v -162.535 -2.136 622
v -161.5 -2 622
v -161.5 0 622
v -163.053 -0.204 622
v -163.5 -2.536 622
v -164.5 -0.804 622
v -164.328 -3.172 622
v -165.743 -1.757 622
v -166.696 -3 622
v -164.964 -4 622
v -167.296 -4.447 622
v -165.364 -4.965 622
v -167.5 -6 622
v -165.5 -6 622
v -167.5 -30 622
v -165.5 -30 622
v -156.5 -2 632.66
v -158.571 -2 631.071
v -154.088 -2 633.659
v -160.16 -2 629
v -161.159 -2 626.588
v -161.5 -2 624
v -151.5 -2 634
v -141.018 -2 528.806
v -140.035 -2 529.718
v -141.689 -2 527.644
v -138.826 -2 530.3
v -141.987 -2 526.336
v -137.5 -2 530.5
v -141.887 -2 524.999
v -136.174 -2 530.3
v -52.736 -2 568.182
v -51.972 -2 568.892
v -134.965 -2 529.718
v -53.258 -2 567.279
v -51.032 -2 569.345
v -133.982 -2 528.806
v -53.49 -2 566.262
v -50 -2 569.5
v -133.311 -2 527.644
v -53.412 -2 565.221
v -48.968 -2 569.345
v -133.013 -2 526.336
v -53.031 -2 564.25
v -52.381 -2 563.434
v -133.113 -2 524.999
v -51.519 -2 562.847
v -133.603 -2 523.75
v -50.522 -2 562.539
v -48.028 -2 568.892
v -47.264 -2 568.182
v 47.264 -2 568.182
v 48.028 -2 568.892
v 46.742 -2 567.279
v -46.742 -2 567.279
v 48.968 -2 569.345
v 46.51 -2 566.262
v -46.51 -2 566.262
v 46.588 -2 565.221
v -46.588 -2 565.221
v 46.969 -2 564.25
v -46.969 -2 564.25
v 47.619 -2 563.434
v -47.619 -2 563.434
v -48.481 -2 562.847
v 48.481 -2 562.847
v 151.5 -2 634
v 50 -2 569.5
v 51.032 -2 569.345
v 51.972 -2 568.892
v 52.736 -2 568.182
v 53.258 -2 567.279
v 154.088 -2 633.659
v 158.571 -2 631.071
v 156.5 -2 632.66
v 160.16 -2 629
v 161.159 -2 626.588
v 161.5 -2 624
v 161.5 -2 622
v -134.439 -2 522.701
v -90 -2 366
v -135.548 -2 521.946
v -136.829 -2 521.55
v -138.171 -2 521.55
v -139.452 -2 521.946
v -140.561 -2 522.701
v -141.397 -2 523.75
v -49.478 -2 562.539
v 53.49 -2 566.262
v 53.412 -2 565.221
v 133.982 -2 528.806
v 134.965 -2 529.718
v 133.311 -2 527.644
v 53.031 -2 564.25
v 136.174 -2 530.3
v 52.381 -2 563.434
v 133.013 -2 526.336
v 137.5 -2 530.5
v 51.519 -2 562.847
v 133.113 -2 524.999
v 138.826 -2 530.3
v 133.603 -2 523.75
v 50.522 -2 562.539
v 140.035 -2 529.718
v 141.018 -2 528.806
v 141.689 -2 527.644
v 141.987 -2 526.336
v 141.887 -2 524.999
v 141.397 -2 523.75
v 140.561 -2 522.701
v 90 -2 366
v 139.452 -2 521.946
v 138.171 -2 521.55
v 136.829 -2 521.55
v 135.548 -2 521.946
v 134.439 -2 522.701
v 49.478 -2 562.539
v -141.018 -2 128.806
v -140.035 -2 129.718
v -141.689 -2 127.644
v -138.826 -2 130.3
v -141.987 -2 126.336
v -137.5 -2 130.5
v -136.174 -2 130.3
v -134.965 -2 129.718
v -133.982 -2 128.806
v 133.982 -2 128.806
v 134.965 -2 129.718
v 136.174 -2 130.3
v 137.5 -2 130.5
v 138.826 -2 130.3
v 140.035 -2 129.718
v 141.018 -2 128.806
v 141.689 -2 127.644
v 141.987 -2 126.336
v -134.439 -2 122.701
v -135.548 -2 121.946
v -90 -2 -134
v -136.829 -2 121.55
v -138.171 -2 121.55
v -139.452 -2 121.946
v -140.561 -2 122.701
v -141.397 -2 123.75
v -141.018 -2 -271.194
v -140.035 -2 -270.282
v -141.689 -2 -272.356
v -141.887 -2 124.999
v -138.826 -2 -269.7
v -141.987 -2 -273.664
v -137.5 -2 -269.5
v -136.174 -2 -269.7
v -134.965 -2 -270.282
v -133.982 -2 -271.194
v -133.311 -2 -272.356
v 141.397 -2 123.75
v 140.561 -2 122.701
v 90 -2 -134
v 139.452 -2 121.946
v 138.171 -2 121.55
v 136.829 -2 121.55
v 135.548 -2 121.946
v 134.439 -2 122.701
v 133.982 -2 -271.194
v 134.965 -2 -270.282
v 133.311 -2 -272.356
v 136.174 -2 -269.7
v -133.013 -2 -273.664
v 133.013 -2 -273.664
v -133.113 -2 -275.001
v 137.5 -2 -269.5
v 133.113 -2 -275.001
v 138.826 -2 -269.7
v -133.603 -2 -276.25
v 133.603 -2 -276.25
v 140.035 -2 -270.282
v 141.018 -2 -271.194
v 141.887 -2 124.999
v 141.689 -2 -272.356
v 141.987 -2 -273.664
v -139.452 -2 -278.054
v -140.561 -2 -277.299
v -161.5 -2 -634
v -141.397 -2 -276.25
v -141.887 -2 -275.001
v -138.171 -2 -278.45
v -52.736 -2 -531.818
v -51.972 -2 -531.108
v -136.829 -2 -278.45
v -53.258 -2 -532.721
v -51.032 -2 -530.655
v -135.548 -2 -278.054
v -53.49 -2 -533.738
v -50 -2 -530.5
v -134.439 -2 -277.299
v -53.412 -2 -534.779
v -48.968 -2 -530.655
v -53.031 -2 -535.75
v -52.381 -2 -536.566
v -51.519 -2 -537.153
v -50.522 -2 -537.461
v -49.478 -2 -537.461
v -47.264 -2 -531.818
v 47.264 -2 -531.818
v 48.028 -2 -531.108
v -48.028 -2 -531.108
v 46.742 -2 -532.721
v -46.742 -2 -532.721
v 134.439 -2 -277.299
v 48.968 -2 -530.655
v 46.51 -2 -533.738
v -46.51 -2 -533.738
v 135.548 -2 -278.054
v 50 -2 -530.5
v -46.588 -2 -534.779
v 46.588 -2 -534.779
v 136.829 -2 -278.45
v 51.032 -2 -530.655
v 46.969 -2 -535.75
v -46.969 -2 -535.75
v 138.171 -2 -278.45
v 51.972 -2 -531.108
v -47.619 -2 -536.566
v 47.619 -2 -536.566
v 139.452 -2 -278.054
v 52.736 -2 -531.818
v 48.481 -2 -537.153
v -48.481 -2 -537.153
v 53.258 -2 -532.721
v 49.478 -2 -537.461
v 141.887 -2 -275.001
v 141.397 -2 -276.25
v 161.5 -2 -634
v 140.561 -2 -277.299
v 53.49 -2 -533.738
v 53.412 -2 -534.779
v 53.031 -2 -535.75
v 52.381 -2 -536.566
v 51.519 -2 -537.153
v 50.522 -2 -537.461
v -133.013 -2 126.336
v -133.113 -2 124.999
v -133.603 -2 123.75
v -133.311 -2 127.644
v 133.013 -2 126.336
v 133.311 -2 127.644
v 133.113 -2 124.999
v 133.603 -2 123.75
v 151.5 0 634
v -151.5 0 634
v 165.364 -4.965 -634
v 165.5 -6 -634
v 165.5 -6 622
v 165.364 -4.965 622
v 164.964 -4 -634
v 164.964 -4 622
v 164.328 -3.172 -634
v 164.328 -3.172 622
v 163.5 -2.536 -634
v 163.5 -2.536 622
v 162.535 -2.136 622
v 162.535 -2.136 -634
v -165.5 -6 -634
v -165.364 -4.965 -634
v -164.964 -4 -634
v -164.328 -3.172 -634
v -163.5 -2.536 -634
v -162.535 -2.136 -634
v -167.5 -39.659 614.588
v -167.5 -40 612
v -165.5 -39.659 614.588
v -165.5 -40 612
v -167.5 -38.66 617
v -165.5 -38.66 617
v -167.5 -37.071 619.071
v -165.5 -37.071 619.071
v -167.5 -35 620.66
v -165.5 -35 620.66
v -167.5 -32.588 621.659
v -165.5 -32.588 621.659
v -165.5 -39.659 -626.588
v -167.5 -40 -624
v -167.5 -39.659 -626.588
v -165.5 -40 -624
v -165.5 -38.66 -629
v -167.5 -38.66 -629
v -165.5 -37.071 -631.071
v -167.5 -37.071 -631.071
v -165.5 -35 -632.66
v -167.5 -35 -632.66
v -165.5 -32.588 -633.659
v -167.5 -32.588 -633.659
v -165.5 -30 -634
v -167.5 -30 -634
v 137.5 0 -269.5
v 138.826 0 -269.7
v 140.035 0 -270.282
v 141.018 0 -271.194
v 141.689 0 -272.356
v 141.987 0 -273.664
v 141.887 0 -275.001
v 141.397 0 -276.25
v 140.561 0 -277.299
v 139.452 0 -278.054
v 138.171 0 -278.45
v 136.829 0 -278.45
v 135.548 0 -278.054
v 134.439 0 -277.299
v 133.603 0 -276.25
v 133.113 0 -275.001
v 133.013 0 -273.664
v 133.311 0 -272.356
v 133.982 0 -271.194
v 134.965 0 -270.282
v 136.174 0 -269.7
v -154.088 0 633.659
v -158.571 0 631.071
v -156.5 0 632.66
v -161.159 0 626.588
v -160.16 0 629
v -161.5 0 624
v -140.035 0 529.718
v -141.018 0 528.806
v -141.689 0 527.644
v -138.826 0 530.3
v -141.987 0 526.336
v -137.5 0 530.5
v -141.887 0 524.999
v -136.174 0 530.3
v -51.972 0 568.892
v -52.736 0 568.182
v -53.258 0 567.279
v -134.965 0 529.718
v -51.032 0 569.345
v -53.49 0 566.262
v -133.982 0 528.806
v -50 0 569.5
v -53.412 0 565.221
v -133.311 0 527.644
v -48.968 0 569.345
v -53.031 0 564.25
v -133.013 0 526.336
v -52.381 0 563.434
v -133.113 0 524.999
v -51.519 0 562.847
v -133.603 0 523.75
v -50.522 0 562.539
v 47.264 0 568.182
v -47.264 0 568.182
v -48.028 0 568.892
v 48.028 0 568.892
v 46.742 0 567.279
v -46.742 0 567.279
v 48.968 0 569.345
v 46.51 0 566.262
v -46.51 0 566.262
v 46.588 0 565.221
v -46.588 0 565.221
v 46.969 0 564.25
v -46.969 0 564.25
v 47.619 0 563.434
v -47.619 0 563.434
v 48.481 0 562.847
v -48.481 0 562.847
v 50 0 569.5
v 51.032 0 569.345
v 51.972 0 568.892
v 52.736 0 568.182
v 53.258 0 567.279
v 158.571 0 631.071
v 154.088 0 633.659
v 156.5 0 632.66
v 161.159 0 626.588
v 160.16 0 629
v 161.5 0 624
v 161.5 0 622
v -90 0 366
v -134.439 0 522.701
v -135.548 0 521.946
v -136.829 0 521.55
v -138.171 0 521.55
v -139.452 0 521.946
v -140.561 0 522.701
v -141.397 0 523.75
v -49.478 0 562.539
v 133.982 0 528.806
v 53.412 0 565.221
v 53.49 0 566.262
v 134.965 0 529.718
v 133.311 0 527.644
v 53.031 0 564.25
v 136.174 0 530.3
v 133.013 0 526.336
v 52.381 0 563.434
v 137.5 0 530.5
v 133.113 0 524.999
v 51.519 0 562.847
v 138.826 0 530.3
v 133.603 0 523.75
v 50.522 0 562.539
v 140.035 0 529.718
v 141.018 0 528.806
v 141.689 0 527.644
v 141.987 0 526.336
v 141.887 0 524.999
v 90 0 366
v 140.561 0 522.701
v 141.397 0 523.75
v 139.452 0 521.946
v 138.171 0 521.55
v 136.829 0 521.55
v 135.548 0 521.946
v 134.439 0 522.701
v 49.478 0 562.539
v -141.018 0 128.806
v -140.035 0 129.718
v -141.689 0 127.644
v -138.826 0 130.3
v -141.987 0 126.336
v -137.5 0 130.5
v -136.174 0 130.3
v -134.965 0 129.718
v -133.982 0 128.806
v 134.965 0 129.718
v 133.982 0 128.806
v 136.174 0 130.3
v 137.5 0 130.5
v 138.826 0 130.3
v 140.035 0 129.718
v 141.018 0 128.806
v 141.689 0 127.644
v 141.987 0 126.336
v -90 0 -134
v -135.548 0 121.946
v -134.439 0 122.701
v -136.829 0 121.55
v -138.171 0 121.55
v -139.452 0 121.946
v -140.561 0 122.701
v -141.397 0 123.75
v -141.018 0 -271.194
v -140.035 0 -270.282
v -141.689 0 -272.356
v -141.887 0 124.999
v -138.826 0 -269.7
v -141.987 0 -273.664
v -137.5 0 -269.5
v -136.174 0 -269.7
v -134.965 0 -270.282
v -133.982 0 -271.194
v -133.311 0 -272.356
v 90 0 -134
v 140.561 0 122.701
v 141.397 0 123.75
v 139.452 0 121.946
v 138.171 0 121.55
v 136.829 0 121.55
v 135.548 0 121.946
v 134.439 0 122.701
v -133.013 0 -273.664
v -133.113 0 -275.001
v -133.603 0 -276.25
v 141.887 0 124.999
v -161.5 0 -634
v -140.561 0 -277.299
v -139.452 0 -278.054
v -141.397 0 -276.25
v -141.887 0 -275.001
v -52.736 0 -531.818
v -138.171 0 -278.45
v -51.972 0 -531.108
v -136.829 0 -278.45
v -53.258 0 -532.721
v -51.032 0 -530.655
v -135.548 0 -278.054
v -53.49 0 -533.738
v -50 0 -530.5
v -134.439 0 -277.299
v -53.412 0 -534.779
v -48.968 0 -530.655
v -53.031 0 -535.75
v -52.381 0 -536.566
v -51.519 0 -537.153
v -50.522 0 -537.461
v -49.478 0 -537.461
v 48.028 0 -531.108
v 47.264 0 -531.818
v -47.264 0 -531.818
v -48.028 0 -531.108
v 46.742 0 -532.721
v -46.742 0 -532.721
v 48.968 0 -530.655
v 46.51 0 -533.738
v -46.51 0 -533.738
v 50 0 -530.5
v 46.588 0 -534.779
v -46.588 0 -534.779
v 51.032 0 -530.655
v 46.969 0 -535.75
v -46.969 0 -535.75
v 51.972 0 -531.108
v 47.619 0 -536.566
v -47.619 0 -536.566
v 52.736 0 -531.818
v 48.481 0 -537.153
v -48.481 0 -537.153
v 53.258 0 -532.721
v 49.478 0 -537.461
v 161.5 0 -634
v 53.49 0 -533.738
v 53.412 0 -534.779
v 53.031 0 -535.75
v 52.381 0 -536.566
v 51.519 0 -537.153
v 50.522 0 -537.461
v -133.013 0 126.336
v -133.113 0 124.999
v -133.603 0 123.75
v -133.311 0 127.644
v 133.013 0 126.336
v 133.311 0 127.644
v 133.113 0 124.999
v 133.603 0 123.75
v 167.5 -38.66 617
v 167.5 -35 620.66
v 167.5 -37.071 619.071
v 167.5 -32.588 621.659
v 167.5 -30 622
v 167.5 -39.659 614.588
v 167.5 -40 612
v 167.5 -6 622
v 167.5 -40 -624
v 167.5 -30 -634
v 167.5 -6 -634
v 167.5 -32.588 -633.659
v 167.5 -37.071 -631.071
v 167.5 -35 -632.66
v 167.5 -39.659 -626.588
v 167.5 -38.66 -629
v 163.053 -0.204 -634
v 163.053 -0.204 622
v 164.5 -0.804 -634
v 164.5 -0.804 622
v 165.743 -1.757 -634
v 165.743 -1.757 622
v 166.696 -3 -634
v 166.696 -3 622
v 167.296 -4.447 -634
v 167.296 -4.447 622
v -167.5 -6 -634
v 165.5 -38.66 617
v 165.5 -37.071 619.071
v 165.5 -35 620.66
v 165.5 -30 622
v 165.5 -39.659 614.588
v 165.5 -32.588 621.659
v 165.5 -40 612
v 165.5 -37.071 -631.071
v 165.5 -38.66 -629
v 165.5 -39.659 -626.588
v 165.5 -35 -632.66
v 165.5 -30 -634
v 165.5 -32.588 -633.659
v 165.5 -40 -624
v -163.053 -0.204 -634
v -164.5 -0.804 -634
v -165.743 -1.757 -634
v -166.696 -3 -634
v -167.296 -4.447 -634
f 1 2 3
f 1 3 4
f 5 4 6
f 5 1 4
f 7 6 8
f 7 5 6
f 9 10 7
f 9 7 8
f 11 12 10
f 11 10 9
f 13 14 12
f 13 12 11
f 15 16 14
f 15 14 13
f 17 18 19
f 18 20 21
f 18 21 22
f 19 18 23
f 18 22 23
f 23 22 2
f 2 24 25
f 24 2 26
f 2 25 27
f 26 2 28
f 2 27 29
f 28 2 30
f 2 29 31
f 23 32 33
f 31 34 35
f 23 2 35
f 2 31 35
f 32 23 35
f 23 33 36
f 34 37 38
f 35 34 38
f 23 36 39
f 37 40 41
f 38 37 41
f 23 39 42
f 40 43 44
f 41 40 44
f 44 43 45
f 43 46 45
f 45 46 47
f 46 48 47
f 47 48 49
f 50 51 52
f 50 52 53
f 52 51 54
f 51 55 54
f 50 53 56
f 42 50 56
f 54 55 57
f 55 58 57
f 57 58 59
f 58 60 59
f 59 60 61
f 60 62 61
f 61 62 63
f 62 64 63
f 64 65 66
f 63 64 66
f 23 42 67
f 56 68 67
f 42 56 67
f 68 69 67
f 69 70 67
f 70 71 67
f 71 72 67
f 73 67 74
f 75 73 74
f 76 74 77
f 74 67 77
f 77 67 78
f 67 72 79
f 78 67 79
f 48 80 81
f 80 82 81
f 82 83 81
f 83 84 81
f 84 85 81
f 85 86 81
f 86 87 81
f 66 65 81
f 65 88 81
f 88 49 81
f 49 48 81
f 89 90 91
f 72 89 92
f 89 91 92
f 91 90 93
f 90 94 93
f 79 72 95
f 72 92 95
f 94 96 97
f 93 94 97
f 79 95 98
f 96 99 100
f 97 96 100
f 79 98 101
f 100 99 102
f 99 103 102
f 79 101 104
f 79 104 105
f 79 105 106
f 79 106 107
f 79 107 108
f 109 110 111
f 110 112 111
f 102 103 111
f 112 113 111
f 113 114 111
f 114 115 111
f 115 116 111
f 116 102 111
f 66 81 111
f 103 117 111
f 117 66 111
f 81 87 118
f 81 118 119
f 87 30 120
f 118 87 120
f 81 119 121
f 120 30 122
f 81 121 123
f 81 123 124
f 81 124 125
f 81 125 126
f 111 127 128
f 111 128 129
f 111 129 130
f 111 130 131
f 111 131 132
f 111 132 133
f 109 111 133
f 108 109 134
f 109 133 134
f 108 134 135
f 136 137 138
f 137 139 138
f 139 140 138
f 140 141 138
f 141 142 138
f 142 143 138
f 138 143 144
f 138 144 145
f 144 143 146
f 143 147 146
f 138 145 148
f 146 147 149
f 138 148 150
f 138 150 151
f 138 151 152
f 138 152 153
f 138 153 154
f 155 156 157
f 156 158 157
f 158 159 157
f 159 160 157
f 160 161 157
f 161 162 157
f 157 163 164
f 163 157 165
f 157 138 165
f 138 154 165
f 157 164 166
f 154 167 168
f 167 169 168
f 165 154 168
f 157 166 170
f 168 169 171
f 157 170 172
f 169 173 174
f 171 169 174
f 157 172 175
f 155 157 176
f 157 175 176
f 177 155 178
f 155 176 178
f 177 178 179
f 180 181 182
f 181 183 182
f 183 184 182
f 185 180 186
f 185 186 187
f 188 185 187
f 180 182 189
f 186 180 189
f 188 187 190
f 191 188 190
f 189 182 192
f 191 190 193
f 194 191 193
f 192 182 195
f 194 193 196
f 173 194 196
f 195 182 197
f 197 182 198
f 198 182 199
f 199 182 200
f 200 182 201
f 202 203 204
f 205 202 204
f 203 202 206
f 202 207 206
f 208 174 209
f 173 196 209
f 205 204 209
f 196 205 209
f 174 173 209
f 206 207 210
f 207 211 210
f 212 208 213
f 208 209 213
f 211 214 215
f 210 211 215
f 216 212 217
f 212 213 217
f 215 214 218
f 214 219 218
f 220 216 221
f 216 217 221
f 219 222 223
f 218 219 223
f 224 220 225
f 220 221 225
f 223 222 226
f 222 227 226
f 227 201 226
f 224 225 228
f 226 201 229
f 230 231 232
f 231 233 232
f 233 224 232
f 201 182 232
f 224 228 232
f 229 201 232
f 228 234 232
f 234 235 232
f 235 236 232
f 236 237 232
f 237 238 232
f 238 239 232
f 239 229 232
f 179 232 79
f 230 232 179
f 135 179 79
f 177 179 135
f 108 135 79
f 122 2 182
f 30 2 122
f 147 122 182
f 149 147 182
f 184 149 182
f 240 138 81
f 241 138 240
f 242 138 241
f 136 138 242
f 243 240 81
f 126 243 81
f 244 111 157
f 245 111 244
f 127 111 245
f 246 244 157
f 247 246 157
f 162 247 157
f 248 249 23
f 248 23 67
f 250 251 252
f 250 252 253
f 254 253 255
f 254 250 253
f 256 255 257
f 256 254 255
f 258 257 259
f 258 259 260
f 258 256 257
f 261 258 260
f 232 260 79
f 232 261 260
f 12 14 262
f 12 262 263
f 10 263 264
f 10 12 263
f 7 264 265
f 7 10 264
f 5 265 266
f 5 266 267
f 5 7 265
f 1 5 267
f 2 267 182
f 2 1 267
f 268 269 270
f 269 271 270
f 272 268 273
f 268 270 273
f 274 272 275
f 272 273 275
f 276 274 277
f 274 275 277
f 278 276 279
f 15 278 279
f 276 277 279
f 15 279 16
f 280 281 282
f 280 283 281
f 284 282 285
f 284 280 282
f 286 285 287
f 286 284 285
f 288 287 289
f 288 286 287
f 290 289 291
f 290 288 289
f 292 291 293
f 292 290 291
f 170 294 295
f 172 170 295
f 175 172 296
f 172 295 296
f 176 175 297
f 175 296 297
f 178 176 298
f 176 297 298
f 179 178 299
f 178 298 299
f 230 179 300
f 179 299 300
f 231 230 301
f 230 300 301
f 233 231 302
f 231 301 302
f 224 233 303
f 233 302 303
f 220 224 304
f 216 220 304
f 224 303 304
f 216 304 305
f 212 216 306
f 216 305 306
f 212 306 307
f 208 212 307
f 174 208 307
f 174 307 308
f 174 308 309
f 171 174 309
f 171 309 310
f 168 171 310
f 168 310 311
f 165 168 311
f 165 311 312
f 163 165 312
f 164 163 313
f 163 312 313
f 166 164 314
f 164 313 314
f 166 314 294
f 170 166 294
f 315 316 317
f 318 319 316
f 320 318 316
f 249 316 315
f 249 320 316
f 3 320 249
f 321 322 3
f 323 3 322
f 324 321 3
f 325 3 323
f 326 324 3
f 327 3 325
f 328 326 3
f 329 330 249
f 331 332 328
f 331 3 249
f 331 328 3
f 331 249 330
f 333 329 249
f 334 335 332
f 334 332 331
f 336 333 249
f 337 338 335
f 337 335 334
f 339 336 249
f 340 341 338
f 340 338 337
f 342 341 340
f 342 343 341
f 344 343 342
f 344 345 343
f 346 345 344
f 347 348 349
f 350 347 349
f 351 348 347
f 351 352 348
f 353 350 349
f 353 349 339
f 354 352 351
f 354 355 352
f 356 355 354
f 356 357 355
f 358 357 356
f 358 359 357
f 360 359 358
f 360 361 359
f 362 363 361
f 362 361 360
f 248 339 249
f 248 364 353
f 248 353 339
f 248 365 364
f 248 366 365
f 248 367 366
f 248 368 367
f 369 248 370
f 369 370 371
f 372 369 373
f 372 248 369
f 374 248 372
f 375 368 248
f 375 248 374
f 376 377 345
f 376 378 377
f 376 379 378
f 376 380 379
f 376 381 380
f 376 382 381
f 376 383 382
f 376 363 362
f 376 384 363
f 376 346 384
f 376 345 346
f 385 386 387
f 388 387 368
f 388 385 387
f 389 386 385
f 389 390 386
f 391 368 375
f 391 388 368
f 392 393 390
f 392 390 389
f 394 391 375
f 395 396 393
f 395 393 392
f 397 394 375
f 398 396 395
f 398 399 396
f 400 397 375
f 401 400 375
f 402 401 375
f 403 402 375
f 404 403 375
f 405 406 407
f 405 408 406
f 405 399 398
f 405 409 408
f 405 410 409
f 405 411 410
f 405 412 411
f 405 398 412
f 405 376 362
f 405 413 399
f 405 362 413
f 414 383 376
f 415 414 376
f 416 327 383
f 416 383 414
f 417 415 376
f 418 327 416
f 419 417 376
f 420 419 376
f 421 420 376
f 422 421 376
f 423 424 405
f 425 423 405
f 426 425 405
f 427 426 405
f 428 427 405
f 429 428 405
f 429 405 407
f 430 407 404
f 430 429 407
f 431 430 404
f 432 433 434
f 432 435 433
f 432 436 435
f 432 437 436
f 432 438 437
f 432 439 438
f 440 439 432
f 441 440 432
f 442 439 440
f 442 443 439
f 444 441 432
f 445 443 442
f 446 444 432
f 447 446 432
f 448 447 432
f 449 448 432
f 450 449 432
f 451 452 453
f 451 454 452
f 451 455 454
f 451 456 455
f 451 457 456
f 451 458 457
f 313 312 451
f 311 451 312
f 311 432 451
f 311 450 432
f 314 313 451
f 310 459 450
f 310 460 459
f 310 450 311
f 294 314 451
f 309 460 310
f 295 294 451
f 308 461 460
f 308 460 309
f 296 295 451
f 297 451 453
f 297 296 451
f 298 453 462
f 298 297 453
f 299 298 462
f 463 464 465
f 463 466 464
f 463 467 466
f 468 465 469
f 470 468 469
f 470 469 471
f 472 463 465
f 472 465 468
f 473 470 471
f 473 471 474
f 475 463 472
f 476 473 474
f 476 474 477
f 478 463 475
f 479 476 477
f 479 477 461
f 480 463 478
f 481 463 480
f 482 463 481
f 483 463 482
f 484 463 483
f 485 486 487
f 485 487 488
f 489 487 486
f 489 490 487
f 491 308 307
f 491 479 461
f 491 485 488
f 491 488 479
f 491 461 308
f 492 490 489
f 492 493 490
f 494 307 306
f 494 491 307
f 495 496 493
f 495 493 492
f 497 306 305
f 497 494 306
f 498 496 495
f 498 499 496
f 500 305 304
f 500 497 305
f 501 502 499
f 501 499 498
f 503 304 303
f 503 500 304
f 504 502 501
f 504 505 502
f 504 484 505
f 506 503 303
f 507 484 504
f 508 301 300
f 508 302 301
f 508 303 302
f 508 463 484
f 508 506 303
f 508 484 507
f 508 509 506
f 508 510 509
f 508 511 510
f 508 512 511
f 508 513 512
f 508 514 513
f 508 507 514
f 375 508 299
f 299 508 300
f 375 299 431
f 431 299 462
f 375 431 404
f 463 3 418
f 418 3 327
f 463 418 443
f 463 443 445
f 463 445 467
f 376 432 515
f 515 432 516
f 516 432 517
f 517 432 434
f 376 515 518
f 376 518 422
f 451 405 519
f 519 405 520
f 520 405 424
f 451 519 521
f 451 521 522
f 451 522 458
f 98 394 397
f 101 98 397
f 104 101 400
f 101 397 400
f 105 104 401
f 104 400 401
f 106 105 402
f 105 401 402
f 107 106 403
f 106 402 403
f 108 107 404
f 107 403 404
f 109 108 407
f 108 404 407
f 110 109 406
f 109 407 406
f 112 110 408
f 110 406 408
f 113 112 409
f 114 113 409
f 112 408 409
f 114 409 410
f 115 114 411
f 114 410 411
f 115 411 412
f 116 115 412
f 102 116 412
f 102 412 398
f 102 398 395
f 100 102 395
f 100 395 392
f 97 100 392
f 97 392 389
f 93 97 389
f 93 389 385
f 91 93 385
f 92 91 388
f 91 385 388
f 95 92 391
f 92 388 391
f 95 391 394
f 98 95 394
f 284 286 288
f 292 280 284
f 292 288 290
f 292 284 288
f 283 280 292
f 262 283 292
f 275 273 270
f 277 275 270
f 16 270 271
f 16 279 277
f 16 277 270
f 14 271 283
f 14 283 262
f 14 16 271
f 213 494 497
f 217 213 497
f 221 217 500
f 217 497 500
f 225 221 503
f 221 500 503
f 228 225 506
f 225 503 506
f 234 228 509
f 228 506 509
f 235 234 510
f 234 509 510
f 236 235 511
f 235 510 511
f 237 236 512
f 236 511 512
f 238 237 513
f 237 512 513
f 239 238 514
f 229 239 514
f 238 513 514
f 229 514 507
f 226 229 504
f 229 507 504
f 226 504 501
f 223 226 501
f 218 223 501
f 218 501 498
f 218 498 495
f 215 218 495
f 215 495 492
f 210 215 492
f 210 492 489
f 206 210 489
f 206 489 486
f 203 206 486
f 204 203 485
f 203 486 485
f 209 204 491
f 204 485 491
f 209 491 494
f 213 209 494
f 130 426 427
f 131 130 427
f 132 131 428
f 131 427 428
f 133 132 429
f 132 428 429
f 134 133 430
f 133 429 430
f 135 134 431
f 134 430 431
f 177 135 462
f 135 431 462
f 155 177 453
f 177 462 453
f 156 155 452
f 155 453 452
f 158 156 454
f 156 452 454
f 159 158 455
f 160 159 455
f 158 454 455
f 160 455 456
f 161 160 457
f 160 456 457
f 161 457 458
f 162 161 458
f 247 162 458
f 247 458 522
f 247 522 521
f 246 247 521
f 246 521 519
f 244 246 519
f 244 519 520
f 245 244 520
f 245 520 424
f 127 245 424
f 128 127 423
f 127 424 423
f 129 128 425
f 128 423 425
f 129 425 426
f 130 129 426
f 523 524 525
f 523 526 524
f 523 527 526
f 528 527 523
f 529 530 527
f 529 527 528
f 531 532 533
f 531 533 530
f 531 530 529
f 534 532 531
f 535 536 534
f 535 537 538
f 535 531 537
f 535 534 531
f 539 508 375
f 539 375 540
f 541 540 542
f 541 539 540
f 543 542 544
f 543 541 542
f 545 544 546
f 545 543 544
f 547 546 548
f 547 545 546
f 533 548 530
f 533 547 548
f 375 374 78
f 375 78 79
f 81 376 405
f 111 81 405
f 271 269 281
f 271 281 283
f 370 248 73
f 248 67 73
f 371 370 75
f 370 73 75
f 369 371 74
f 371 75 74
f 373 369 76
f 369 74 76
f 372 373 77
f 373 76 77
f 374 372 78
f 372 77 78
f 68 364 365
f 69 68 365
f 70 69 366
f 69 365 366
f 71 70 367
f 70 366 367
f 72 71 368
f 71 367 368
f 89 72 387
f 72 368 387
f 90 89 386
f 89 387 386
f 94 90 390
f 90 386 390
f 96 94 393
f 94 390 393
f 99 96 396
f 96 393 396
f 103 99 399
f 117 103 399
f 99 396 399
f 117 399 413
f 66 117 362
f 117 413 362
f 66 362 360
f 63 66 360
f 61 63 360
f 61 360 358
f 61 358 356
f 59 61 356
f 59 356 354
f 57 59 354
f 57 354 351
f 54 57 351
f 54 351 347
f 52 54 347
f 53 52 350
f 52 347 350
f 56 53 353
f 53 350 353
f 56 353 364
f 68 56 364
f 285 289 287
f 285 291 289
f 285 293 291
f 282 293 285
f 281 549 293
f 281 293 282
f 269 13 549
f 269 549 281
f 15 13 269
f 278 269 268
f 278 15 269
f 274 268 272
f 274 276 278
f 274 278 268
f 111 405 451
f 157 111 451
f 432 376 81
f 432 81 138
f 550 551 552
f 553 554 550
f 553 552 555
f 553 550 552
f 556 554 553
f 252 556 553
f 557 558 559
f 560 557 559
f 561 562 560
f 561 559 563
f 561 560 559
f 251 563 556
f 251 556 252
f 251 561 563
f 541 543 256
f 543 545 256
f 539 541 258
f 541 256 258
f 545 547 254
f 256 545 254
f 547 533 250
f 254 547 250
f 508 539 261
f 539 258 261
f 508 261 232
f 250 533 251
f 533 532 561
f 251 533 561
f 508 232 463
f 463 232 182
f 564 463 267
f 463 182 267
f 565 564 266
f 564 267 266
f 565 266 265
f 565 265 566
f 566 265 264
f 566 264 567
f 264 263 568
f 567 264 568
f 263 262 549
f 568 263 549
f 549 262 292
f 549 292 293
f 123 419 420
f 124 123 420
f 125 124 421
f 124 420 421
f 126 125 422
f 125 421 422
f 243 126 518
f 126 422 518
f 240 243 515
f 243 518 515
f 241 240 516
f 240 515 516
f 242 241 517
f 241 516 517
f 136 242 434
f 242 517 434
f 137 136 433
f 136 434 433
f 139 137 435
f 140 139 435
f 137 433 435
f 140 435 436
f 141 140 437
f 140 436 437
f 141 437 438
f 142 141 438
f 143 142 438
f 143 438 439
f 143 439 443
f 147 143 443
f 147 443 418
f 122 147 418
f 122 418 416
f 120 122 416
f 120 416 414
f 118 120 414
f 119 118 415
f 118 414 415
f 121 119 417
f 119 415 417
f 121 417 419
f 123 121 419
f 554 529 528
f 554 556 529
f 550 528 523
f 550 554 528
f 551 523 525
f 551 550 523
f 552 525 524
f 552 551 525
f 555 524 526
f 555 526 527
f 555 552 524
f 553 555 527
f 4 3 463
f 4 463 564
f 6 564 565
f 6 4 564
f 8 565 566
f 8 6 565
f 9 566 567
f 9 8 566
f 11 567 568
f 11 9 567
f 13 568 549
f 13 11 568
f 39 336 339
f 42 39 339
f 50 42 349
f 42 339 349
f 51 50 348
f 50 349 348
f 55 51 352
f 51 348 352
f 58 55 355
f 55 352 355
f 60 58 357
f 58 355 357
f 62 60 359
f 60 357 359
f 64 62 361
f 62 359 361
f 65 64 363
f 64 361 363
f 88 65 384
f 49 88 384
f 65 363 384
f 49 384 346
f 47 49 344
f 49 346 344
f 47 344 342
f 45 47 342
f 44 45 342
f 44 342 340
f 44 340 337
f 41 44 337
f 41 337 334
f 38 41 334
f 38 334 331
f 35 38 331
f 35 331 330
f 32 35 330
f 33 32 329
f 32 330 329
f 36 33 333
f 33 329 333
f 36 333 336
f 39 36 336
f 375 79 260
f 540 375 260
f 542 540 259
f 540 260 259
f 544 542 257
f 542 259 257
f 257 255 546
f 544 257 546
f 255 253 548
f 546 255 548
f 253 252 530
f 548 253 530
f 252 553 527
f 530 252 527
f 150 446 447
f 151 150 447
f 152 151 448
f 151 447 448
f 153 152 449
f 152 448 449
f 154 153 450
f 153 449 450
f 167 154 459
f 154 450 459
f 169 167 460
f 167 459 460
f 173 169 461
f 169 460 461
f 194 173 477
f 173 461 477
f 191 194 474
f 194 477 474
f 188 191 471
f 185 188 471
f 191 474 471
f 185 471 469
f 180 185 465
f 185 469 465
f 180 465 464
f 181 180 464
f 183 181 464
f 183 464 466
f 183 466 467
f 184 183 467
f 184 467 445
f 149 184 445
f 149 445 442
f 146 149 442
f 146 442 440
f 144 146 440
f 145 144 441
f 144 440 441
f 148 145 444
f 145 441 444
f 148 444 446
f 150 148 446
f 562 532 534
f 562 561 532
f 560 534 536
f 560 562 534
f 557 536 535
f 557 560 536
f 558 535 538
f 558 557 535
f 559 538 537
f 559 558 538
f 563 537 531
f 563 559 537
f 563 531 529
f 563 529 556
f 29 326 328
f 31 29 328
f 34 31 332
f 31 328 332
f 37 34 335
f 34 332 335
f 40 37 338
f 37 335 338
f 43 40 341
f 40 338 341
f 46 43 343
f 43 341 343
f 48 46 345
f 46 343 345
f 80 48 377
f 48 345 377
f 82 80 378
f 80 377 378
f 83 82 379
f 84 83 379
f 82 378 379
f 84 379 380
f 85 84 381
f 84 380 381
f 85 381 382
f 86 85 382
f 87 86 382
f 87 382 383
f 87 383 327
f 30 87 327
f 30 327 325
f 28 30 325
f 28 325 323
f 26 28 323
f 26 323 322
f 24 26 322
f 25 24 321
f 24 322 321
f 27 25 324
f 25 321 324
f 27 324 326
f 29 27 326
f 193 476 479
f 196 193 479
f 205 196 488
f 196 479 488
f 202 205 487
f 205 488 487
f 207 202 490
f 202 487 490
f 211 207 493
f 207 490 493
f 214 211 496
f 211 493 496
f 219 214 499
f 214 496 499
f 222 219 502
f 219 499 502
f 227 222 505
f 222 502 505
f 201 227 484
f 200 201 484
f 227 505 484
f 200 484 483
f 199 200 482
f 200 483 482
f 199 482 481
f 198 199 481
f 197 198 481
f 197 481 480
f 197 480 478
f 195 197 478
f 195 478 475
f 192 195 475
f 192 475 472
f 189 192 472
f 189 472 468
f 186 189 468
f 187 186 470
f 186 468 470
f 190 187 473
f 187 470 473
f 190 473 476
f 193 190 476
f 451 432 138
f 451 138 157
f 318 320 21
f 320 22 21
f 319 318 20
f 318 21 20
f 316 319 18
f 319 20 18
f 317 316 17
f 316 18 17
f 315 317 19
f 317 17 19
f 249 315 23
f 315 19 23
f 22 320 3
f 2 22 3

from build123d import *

# Parameters (mm, degrees)
SKETCH_1_W                  = 323
SKETCH_1_H                  = 1268
SKETCH_1_R                  = 4.5
SKETCH_1_R_2                = 3.5
SKETCH_1_W_2                = 180
SKETCH_1_H_2                = 500
SM_BASE_FLANGE_1_DEPTH      = 2
SM_EDGE_FLANGE_1_DEPTH      = 1256
SM_EDGE_FLANGE_1_BEND_DEPTH = 1256
FILLET_1_R                  = 10
FILLET_2_R                  = 10


# Sheet-metal steps are written as plain solids
with BuildPart() as part:
    # Sketch 1 → Базовая кромка1 (new body)
    with BuildSketch(Plane(origin=(0, 0, 0), x_dir=(1, 0, 0), z_dir=(0, 1, 0))):
        Rectangle(SKETCH_1_W, SKETCH_1_H)
        with Locations(Location((-137.5, -526, 0), (0, 0, 270))):
            Circle(SKETCH_1_R, mode=Mode.SUBTRACT)
        with Locations(Location((137.5, -526, 0), (0, 0, 270))):
            Circle(SKETCH_1_R, mode=Mode.SUBTRACT)
        with Locations(Location((-137.5, -126, 0), (0, 0, 270))):
            Circle(SKETCH_1_R, mode=Mode.SUBTRACT)
        with Locations(Location((137.5, -126, 0), (0, 0, 270))):
            Circle(SKETCH_1_R, mode=Mode.SUBTRACT)
        with Locations(Location((-137.5, 274, 0), (0, 0, 270))):
            Circle(SKETCH_1_R, mode=Mode.SUBTRACT)
        with Locations(Location((137.5, 274, 0), (0, 0, 270))):
            Circle(SKETCH_1_R, mode=Mode.SUBTRACT)
        with Locations(Location((-50, -566, 0), (0, 0, 270))):
            Circle(SKETCH_1_R_2, mode=Mode.SUBTRACT)
        with Locations(Location((50, -566, 0), (0, 0, 270))):
            Circle(SKETCH_1_R_2, mode=Mode.SUBTRACT)
        with Locations(Location((-50, 534, 0), (0, 0, 270))):
            Circle(SKETCH_1_R_2, mode=Mode.SUBTRACT)
        with Locations(Location((50, 534, 0), (0, 0, 270))):
            Circle(SKETCH_1_R_2, mode=Mode.SUBTRACT)
        with Locations((0, -116)):
            Rectangle(SKETCH_1_W_2, SKETCH_1_H_2, mode=Mode.SUBTRACT)
    extrude(amount=-SM_BASE_FLANGE_1_DEPTH)

    # Ребро-кромка1 section (across the edge) → Ребро-кромка1 (add)
    with BuildSketch(Plane(origin=(165.5, -2, -634), x_dir=(-1, 0, 0), z_dir=(0, 0, 1))):
        with BuildLine():
            Line((-2, 4), (-2, 38))
            Line((-2, 38), (0, 38))
            Line((0, 38), (0, 4))
            ThreePointArc((0, 4), (1.171572875, 1.171572875), (4, 0))
            Line((4, 0), (4, -2))
            ThreePointArc((4, -2), (-0.242640687, -0.242640687), (-2, 4))
        make_face()
    extrude(amount=SM_EDGE_FLANGE_1_DEPTH)

    # Ребро-кромка1 section 2 (across the edge) → Ребро-кромка1 bend (add)
    with BuildSketch(Plane(origin=(-165.5, -2, 622), x_dir=(1, 0, 0), z_dir=(0, 0, -1))):
        with BuildLine():
            Line((-2, 4), (-2, 38))
            Line((-2, 38), (0, 38))
            Line((0, 38), (0, 4))
            ThreePointArc((0, 4), (1.171572875, 1.171572875), (4, 0))
            Line((4, 0), (4, -2))
            ThreePointArc((4, -2), (-0.242640687, -0.242640687), (-2, 4))
        make_face()
    extrude(amount=SM_EDGE_FLANGE_1_BEND_DEPTH)

    # Скругление1
    fillet_1_edges = [part.edges().sort_by_distance(p)[0] for p in [
        (-166.5, -40, 622),
        (-166.5, -40, -634),
        (166.5, -40, -634),
        (166.5, -40, 622),
    ]]
    fillet(fillet_1_edges, radius=FILLET_1_R)

    # Скругление2
    fillet_2_edges = [part.edges().sort_by_distance(p)[0] for p in [
        (161.5, -1, 634),
        (-161.5, -1, 634),
    ]]
    fillet(fillet_2_edges, radius=FILLET_2_R)


solid = part.part
